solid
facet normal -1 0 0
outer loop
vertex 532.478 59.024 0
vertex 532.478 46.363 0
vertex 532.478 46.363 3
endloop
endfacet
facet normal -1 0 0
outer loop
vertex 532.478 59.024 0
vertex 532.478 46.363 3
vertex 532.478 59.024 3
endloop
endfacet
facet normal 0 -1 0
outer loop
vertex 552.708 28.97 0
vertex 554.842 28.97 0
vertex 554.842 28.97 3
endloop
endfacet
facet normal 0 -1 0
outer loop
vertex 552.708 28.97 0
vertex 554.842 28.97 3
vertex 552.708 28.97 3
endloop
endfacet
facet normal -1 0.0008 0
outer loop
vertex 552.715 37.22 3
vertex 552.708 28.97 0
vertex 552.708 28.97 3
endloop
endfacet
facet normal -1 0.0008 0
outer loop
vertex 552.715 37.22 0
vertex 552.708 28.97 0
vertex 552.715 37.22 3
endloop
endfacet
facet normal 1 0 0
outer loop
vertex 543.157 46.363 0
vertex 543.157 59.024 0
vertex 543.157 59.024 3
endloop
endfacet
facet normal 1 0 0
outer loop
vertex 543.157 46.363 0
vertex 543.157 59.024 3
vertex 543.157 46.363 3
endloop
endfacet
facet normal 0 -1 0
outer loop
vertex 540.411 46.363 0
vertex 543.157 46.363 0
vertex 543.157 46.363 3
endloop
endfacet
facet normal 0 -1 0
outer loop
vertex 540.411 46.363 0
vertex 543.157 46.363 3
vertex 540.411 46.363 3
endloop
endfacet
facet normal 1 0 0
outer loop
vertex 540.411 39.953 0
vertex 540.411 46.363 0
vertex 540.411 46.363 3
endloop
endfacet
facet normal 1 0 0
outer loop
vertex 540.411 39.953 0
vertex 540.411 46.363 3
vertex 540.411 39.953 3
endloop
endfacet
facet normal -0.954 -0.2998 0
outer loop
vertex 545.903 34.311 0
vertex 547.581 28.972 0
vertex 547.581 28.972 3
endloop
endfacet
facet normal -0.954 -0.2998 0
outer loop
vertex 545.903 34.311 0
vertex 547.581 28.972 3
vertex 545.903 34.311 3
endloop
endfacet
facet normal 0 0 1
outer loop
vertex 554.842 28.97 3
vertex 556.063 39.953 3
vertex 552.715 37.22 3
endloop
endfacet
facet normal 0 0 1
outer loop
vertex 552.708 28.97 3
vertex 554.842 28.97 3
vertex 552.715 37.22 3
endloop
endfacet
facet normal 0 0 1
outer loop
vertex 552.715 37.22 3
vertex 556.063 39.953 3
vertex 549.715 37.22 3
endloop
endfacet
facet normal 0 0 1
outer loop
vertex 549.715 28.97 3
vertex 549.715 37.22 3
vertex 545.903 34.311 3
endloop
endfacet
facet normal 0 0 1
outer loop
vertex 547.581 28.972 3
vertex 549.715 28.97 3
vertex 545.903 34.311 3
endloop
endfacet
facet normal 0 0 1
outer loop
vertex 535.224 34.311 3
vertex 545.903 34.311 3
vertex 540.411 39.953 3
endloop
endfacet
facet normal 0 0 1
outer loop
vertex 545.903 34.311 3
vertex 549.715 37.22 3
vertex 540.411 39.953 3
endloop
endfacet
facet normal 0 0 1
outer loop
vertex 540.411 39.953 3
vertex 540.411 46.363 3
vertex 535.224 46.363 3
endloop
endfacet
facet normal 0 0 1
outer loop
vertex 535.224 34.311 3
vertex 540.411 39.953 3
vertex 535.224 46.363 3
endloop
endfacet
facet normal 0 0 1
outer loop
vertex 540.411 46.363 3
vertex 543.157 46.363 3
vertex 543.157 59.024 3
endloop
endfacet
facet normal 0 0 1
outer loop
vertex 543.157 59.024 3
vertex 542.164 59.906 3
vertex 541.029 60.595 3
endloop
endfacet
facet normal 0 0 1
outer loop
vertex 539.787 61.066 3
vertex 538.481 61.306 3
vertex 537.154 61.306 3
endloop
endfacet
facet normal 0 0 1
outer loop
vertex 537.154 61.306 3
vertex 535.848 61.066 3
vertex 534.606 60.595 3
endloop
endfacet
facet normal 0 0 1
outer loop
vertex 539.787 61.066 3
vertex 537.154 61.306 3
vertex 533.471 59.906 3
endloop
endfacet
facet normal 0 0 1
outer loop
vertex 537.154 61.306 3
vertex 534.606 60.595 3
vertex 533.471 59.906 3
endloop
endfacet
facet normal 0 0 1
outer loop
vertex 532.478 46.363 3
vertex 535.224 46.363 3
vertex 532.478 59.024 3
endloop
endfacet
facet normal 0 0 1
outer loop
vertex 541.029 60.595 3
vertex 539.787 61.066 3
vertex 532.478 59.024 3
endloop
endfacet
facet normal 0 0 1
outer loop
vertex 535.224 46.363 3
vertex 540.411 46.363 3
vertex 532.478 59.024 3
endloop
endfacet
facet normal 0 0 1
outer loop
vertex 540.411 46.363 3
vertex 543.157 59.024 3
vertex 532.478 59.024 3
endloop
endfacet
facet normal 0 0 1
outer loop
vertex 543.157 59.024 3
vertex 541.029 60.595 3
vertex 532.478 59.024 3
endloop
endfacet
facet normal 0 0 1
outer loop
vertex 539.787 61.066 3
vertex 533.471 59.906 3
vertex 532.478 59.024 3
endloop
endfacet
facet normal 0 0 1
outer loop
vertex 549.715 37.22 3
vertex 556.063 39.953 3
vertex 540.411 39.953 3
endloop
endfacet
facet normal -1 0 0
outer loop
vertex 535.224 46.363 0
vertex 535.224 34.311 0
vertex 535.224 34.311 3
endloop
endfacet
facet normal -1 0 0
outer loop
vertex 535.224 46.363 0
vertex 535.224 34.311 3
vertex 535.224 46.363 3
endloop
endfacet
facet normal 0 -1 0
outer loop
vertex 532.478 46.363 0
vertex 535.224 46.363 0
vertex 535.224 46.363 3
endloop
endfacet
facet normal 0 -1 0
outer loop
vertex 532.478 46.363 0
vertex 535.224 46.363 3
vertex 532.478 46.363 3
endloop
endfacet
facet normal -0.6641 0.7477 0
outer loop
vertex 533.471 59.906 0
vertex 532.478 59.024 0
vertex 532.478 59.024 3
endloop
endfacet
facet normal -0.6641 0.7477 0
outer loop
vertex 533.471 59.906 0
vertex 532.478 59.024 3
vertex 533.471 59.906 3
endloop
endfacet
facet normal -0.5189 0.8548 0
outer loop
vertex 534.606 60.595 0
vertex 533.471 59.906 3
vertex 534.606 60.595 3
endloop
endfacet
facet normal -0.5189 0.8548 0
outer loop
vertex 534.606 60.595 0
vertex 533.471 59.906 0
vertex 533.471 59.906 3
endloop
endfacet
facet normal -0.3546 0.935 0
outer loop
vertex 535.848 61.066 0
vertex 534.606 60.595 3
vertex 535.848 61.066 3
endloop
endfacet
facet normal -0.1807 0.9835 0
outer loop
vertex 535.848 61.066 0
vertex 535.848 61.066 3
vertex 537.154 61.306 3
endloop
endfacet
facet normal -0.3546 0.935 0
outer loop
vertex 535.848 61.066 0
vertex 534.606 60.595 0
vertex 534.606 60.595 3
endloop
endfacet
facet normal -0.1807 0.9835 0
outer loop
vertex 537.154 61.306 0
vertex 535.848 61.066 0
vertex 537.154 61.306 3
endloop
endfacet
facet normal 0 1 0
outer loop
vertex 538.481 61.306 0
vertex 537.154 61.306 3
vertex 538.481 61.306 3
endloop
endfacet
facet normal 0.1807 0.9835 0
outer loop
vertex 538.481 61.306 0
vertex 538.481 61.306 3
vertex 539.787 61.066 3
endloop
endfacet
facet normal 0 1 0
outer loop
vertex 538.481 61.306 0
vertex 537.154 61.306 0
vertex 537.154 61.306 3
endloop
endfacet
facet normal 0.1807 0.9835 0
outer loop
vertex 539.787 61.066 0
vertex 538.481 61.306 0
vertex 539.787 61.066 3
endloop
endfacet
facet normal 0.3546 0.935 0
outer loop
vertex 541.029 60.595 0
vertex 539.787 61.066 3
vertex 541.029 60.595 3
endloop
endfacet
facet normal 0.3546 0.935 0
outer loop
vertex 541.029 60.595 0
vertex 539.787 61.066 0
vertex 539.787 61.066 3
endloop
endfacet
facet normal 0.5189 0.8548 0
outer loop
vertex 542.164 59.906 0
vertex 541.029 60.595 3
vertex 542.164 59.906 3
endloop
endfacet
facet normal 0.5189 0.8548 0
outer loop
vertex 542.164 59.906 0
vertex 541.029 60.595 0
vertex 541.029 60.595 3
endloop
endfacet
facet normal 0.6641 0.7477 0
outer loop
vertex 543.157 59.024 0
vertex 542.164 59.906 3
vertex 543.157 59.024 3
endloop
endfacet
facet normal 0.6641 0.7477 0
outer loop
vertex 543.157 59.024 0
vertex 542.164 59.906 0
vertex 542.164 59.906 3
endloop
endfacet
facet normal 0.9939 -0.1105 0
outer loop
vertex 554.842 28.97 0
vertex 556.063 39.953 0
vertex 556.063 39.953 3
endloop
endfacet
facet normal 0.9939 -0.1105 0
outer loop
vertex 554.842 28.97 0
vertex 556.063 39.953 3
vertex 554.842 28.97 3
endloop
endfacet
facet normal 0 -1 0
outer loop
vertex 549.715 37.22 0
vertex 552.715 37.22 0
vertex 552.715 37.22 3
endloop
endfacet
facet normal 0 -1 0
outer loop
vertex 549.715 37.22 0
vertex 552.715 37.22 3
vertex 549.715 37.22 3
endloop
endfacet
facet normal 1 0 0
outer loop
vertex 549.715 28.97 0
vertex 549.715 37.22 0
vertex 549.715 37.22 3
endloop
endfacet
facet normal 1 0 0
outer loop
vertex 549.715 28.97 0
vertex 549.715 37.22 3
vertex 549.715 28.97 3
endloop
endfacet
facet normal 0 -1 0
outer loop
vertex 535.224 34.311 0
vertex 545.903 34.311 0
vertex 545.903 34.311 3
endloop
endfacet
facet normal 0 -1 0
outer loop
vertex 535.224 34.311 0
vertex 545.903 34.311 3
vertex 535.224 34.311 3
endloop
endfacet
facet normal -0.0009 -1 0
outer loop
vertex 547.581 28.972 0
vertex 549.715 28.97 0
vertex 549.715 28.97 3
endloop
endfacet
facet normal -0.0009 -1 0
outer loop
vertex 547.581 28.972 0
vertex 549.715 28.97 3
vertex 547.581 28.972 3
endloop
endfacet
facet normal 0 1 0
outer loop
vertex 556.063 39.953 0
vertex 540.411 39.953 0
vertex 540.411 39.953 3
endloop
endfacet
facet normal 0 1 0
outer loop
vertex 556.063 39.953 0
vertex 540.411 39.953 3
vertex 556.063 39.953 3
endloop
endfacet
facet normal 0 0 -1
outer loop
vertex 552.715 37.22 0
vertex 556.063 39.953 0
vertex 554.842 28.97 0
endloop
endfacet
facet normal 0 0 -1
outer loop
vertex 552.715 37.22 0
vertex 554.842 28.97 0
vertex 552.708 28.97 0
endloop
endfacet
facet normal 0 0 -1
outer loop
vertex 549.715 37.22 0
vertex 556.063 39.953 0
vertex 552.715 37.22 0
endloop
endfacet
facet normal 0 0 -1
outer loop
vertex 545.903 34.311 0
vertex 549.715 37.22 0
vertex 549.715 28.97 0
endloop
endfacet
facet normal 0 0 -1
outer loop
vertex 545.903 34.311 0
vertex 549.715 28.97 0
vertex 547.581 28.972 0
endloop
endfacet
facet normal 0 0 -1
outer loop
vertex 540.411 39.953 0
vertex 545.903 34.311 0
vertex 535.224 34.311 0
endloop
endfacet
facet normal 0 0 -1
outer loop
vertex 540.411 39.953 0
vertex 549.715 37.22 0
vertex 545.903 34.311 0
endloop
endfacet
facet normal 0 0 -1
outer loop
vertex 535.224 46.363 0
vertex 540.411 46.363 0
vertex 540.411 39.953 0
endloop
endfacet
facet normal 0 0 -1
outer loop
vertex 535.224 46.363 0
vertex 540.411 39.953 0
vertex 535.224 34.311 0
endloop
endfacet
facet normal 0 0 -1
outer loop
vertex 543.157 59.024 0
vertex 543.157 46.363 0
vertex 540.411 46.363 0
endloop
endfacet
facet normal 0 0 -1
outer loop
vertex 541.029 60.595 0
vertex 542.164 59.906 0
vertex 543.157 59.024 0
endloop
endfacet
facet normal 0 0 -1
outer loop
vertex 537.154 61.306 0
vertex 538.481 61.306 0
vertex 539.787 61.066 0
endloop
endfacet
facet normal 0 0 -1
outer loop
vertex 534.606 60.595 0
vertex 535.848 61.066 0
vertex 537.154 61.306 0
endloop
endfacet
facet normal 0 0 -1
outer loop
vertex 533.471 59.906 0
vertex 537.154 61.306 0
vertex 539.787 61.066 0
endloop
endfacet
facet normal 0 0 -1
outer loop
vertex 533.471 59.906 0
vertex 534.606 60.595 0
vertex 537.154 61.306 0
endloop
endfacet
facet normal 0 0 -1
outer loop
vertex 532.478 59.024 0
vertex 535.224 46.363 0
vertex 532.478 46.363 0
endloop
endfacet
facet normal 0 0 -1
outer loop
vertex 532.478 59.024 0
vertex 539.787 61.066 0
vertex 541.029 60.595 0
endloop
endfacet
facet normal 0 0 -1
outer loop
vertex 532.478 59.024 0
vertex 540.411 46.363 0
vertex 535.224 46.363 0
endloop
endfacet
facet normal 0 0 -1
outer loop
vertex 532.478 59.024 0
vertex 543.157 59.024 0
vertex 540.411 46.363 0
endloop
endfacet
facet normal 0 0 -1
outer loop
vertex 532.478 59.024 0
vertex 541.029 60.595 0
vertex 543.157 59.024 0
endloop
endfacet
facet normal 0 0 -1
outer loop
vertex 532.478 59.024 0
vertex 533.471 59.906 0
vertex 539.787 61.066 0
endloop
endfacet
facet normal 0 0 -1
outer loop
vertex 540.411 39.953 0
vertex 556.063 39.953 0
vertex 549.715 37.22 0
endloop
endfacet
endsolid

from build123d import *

# Parameters (mm, degrees)
BASE_EXTRUDE_DEPTH = 3


with BuildPart() as part:
    # Sketch1 → Base-Extrude (new body)
    with BuildSketch(Plane.XY):
        with BuildLine():
            Line((540.410759596, 46.36273023), (540.410759596, 39.95336404))
            Line((540.410759596, 39.95336404), (556.06264322, 39.95336404))
            Line((556.06264322, 39.95336404), (554.842233973, 28.969820695))
            Line((554.842233973, 28.969820695), (552.70789796, 28.969820695))
            Line((552.70789796, 28.969820695), (552.714937566, 37.219817691))
            Line((552.714937566, 37.219817691), (549.714937566, 37.219817691))
            Line((549.714937566, 37.219817691), (549.714937566, 28.969817691))
            Line((549.714937566, 28.969817691), (547.580602727, 28.972055819))
            Line((547.580602727, 28.972055819), (545.902566239, 34.311250108))
            Line((545.902566239, 34.311250108), (535.22410772, 34.311250108))
            Line((535.22410772, 34.311250108), (535.22410772, 46.36273023))
            Line((535.22410772, 46.36273023), (532.478204398, 46.36273023))
            Line((532.478204398, 46.36273023), (532.478204398, 46.515272643))
            Line((532.478204398, 46.515272643), (532.478204398, 59.024310063))
            ThreePointArc((532.478204398, 59.024310063), (537.817433658, 61.336415723), (543.156662918, 59.024310063))
            Line((543.156662918, 59.024310063), (543.156662918, 46.36273023))
            Line((543.156662918, 46.36273023), (540.410759596, 46.36273023))
        make_face()
    extrude(amount=BASE_EXTRUDE_DEPTH)


solid = part.part
